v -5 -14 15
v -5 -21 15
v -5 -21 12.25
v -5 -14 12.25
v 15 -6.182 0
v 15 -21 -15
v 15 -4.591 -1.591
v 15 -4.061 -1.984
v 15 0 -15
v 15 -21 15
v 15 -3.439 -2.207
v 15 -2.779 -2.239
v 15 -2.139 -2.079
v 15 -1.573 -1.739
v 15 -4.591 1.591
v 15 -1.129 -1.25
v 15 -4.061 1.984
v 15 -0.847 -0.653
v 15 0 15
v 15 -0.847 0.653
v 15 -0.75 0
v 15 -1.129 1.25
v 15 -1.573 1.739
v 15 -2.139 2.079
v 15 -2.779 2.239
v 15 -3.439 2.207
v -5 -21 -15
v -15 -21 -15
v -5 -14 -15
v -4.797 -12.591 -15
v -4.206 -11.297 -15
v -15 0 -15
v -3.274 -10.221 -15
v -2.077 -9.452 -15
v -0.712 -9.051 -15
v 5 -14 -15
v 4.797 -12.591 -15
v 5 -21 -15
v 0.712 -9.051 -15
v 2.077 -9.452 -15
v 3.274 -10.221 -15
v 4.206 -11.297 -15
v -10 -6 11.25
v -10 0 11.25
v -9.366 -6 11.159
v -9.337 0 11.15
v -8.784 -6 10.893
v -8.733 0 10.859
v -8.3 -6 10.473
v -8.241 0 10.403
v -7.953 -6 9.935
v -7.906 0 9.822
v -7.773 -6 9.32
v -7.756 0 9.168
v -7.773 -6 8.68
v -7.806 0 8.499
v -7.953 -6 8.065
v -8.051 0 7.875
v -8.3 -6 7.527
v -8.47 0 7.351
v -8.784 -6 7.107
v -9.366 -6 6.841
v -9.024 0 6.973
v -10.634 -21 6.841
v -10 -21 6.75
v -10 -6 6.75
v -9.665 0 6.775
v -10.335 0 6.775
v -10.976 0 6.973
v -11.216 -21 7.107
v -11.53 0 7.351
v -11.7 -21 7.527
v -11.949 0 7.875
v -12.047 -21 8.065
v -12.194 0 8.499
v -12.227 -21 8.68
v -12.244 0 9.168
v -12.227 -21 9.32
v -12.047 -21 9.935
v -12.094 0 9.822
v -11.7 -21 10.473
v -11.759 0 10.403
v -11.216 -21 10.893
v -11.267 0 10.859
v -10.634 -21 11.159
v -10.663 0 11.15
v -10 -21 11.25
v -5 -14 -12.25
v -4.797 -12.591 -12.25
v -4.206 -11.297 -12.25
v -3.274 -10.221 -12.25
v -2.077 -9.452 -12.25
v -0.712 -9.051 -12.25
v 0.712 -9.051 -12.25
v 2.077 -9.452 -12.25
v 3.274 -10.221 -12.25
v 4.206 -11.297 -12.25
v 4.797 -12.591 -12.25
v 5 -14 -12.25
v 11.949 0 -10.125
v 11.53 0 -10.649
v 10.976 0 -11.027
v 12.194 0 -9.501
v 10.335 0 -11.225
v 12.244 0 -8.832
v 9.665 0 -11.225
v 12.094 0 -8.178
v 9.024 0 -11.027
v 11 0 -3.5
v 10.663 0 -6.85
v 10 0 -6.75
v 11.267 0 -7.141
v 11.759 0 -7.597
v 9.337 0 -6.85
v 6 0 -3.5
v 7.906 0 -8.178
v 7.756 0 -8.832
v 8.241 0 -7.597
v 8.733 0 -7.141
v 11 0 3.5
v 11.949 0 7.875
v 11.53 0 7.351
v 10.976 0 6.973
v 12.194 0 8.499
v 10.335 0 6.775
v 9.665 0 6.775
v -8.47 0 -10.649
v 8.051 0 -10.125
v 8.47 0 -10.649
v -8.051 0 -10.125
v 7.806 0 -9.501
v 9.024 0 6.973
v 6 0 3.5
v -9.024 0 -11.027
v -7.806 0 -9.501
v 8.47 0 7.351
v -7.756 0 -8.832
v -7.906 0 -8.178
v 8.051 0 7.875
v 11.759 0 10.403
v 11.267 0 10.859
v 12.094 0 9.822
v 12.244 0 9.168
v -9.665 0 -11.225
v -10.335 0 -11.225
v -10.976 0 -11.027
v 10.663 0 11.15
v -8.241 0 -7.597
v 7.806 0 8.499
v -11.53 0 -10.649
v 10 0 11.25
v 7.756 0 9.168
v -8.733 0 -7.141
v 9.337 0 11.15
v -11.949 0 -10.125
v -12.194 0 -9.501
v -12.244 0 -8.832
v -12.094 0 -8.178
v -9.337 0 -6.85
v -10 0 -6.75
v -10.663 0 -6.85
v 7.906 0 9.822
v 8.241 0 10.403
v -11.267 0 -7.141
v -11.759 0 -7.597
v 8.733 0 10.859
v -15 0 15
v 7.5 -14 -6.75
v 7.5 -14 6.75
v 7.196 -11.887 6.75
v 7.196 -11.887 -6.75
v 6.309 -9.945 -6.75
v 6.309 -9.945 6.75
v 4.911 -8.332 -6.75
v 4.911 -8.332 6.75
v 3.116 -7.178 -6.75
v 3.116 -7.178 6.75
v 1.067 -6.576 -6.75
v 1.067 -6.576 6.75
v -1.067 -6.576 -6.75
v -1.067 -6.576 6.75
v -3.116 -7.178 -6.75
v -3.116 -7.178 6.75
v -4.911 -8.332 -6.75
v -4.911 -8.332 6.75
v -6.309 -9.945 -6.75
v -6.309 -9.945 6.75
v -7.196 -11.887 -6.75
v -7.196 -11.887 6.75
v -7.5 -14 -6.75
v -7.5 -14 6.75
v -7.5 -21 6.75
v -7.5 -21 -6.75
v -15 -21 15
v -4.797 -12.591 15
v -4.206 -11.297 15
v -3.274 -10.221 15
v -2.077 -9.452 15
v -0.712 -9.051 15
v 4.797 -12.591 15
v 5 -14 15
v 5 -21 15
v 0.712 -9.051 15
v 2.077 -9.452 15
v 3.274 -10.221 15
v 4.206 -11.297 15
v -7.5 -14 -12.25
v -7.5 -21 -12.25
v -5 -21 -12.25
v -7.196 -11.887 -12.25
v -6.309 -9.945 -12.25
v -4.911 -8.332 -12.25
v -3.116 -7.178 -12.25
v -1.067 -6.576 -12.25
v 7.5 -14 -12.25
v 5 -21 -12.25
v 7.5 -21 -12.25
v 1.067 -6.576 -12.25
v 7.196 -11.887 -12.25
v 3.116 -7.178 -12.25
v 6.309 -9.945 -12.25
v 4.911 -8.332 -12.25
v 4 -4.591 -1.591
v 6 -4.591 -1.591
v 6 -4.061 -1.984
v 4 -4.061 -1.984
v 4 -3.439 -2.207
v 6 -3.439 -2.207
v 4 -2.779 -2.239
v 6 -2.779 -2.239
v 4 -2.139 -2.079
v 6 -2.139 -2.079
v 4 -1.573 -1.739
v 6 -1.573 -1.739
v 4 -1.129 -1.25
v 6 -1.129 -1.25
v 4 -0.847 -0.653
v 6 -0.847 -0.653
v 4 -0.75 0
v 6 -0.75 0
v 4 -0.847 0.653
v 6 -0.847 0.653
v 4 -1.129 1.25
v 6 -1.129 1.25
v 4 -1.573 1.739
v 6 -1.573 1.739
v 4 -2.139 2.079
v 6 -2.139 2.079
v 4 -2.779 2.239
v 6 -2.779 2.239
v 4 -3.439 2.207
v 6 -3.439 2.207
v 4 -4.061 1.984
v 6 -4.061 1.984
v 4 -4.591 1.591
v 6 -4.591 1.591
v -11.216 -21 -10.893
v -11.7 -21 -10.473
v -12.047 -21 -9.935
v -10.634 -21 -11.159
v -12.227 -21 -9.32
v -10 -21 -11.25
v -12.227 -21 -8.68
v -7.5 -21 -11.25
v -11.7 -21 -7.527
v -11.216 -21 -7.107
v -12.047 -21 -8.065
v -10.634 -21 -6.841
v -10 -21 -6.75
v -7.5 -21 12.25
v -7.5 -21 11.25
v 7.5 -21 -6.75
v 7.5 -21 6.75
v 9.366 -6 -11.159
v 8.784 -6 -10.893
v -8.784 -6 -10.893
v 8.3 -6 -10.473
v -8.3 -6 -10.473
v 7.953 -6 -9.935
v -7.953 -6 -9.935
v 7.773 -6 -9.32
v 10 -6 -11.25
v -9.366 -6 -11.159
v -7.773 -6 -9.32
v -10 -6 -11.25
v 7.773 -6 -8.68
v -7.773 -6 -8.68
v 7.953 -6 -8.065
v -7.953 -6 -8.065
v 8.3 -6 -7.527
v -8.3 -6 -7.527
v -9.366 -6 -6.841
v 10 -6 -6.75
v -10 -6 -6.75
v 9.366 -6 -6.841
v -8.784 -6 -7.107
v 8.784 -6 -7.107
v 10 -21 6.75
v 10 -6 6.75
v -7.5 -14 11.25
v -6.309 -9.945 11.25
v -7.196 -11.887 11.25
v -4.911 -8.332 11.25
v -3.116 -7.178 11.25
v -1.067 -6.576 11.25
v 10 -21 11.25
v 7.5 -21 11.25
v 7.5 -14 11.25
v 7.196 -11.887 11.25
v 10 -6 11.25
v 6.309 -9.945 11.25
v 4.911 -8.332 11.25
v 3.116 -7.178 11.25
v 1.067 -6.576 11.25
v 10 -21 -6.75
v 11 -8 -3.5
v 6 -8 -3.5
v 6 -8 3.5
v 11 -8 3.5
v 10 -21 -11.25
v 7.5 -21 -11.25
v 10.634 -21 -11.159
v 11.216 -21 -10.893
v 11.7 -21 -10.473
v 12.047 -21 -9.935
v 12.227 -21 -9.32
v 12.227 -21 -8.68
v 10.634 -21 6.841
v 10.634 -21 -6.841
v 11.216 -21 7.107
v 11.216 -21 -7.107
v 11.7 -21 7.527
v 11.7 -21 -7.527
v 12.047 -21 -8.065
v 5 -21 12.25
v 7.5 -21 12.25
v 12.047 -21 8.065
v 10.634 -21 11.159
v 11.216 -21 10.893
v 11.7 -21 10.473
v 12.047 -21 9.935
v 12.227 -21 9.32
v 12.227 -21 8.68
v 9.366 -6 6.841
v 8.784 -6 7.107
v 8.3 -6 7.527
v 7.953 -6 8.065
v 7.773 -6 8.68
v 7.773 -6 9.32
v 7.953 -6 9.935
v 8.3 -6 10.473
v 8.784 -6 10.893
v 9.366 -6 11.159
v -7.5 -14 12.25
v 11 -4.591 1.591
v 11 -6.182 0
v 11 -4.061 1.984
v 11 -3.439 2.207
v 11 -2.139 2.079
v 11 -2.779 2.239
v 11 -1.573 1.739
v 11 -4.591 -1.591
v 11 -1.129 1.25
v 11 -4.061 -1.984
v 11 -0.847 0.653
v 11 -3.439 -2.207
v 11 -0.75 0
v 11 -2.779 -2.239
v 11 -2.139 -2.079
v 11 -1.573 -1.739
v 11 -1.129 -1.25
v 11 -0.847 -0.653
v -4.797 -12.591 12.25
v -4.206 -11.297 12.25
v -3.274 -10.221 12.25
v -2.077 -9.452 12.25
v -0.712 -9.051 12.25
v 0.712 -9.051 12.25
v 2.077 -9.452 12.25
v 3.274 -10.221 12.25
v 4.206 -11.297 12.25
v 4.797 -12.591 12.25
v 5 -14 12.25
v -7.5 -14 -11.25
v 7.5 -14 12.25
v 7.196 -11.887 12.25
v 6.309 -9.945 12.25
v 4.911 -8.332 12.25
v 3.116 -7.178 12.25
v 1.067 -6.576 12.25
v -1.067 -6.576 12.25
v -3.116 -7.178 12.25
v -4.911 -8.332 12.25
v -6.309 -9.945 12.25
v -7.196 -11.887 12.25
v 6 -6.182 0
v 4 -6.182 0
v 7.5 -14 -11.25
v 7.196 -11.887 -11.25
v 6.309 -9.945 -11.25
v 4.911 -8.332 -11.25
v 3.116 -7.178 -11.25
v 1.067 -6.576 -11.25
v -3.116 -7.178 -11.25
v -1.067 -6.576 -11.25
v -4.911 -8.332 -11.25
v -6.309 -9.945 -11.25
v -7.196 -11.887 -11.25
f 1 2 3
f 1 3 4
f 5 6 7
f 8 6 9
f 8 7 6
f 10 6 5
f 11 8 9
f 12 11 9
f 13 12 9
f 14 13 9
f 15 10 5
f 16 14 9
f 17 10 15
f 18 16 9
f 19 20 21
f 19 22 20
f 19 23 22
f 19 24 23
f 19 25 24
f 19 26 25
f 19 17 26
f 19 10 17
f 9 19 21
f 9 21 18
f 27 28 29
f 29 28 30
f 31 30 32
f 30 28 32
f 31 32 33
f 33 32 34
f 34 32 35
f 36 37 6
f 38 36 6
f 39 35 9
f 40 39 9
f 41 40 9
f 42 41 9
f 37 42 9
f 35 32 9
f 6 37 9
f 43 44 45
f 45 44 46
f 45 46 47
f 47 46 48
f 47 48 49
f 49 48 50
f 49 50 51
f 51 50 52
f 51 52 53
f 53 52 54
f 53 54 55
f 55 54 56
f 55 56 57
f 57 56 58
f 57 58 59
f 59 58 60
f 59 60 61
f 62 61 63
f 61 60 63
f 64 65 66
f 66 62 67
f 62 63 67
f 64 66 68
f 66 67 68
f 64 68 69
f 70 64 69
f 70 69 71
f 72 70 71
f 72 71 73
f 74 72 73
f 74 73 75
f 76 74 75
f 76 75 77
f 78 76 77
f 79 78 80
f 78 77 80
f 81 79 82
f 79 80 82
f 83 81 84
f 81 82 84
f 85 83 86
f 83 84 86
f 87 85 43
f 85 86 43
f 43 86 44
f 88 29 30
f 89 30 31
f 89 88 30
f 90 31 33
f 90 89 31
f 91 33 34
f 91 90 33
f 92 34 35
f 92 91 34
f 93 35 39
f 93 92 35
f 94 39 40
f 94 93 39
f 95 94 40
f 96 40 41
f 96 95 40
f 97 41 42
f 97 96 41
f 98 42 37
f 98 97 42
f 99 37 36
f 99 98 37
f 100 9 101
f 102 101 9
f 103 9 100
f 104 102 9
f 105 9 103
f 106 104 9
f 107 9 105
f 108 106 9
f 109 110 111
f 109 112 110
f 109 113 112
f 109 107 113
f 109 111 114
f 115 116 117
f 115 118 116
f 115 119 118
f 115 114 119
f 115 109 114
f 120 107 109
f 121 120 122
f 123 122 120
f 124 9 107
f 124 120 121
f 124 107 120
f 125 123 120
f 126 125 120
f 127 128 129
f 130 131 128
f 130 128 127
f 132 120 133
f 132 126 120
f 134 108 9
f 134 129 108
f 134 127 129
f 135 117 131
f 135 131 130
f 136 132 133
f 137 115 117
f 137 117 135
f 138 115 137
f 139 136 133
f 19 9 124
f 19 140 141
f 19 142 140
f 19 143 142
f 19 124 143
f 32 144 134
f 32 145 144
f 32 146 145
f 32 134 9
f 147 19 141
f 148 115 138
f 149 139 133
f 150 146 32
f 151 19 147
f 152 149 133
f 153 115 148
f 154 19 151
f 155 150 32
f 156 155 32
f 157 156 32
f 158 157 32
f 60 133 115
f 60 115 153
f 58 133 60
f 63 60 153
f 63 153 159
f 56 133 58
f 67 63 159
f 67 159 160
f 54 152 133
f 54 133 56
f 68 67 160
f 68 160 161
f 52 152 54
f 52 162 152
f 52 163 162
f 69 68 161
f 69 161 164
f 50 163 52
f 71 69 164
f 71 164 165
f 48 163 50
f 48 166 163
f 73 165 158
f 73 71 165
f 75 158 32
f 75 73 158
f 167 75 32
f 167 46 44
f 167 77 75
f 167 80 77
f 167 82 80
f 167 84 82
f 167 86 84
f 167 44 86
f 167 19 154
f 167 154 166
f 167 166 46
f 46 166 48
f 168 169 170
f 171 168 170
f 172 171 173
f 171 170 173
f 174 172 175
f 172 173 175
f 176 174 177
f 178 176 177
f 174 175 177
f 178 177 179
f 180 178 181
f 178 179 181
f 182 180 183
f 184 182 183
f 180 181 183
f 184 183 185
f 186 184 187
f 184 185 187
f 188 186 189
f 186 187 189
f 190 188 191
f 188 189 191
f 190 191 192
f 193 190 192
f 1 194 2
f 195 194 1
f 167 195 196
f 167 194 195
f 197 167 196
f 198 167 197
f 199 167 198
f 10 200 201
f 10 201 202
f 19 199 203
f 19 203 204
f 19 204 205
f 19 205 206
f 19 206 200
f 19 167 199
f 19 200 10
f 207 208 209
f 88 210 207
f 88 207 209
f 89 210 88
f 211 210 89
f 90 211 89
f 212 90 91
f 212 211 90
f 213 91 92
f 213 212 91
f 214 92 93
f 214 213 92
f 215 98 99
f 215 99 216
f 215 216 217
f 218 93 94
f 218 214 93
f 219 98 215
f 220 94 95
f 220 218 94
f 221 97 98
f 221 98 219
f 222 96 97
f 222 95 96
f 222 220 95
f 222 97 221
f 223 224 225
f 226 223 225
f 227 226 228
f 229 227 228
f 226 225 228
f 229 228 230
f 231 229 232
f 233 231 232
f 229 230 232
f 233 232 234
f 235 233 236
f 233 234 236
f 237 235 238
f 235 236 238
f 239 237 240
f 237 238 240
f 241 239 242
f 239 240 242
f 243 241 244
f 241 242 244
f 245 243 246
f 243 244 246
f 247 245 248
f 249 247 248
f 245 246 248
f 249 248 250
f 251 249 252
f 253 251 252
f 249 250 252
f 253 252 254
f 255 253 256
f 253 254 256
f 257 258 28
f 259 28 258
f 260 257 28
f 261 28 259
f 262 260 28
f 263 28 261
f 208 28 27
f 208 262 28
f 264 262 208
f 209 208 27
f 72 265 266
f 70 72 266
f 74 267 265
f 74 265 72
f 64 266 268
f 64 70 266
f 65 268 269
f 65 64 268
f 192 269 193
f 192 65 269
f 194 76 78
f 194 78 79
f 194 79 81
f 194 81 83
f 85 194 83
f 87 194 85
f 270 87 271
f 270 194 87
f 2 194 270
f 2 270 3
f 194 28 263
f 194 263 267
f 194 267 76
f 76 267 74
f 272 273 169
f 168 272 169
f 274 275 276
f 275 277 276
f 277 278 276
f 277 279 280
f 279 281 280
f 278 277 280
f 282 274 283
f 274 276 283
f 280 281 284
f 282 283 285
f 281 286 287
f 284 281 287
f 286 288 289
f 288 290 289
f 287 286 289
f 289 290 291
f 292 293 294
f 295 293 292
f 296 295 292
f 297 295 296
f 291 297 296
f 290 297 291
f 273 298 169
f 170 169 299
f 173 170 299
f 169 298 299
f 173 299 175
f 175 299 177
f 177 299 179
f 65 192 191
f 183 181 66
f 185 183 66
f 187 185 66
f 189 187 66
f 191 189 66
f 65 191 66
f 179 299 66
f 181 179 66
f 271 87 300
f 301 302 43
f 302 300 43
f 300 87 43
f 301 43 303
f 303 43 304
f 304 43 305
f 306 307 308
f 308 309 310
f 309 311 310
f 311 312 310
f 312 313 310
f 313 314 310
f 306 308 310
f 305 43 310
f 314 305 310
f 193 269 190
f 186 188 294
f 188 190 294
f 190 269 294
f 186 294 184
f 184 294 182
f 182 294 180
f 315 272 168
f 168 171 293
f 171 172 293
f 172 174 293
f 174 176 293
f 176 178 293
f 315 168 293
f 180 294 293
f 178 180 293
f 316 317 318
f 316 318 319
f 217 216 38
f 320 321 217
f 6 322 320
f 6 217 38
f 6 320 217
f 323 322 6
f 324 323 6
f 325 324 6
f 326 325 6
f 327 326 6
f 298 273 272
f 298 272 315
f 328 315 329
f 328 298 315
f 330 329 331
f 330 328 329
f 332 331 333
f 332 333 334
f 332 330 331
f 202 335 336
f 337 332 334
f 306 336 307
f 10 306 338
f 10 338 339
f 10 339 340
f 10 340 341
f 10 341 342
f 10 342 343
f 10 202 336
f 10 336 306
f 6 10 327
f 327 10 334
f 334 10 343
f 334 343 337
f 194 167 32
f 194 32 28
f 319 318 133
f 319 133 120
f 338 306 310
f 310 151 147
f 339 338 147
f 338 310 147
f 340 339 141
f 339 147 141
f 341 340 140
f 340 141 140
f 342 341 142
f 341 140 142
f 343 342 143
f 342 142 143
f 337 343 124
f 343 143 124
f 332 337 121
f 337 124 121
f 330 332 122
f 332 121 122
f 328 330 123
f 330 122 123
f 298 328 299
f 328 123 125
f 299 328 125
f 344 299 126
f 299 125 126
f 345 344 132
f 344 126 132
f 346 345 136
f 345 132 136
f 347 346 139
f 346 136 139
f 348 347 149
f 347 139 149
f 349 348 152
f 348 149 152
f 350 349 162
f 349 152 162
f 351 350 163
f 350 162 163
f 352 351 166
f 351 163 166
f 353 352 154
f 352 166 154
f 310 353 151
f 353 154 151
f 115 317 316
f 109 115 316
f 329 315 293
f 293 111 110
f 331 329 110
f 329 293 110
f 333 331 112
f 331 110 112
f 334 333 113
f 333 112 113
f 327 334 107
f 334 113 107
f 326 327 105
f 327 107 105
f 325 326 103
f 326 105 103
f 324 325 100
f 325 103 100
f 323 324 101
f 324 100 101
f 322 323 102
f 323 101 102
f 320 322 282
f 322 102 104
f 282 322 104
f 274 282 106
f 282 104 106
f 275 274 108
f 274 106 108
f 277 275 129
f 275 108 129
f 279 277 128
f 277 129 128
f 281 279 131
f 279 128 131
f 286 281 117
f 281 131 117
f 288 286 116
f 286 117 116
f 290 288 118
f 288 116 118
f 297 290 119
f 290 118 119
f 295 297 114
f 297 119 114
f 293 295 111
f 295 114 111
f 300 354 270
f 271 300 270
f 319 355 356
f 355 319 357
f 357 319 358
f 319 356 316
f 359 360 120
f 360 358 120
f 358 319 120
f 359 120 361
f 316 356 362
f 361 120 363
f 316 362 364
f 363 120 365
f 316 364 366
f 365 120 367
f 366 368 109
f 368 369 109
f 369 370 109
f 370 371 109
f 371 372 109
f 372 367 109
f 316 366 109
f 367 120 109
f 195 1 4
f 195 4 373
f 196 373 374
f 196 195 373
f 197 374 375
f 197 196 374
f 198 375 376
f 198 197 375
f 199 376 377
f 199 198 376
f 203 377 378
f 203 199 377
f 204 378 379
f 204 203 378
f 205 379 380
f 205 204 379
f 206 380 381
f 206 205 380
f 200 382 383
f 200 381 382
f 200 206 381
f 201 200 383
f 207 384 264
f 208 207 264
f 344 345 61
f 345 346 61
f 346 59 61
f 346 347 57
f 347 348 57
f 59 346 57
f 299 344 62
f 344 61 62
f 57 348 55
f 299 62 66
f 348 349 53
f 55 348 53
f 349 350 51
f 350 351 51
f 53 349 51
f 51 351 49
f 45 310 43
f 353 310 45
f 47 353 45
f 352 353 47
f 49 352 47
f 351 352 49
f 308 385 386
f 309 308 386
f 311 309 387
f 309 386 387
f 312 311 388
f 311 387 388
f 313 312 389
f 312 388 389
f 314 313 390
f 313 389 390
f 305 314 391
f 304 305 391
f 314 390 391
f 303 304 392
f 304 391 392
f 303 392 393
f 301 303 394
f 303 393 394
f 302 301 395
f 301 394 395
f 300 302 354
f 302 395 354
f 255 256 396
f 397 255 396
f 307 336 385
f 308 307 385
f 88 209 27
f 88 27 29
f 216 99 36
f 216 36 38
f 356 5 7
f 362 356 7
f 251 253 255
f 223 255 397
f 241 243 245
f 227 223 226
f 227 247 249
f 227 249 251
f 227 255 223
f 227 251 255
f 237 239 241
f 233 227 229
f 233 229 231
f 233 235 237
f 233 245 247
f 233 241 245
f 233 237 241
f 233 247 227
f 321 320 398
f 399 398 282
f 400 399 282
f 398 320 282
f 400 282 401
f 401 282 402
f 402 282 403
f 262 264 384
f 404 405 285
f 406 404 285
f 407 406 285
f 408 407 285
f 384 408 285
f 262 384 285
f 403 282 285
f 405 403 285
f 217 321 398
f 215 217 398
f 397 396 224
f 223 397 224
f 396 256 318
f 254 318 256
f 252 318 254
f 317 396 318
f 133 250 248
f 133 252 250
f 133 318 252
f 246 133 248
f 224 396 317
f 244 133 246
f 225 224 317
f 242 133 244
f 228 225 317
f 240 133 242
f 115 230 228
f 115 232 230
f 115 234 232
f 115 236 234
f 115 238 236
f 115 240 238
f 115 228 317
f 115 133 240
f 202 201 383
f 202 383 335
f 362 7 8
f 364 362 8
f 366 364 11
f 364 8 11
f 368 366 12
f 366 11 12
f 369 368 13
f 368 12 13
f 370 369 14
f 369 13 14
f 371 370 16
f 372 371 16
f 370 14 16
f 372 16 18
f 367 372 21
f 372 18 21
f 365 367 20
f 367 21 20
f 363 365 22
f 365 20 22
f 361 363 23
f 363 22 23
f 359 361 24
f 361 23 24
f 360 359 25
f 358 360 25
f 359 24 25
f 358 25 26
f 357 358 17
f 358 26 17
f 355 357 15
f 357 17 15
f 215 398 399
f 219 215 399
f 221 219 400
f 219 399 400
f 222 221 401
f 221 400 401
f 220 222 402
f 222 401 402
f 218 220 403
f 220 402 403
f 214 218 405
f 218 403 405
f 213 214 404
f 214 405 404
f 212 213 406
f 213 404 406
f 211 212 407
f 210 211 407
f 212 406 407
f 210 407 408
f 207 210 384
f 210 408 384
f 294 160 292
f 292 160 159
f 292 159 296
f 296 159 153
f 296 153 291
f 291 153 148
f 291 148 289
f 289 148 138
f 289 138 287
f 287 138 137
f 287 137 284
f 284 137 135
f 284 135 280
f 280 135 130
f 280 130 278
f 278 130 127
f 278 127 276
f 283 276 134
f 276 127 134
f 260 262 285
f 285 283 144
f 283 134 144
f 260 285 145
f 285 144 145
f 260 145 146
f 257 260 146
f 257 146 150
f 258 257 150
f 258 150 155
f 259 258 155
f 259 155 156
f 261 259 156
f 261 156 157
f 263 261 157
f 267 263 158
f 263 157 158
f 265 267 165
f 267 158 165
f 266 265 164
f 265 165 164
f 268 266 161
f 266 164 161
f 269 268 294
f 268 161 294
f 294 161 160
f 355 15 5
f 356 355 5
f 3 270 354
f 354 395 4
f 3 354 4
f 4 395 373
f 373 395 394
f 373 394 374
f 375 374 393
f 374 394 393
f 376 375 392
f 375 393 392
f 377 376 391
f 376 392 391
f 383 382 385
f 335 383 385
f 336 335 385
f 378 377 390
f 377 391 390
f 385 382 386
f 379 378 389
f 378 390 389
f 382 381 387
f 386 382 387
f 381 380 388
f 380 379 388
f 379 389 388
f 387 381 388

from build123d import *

# Parameters (mm, degrees)
BOSS_EXTRUDE1_DEPTH = 15
SKETCH2_R           = 2.25
CUT_EXTRUDE1_DEPTH  = 30.849623113
CUT_EXTRUDE2_START  = -15
CUT_EXTRUDE2_DEPTH  = 15
CUT_EXTRUDE3_DEPTH  = 12.25
CUT_EXTRUDE4_DEPTH  = 11
SKETCH8_W           = 5
SKETCH8_H           = 7
CUT_EXTRUDE5_DEPTH  = 8


with BuildPart() as part:
    # Sketch1 → Boss-Extrude1 (new, symmetric)
    with BuildSketch(Plane.XY):
        with BuildLine():
            Line((15, 0), (-15, 0))
            Line((-15, 0), (-15, -21))
            Line((-15, -21), (-5, -21))
            Line((-5, -21), (-5, -14))
            ThreePointArc((-5, -14), (0, -9), (5, -14))
            Line((5, -14), (5, -21))
            Line((5, -21), (15, -21))
            Line((15, -21), (15, 0))
        make_face()
    extrude(amount=BOSS_EXTRUDE1_DEPTH, both=True)

    # Sketch2 → Cut-Extrude1 (cut, through all)
    with BuildSketch(Plane(origin=(0, 0, 0), x_dir=(1, 0, 0), z_dir=(0, 1, 0))):
        with Locations((-10, 9)):
            Circle(SKETCH2_R)
        with Locations((10, 9)):
            Circle(SKETCH2_R)
        with Locations((10, -9)):
            Circle(SKETCH2_R)
        with Locations((-10, -9)):
            Circle(SKETCH2_R)
    extrude(amount=-CUT_EXTRUDE1_DEPTH, mode=Mode.SUBTRACT)

    # Sketch3 → Cut-Extrude2 (cut)
    with BuildSketch(Plane.XZ.offset(21).offset(CUT_EXTRUDE2_START)):
        with BuildLine():
            Line((-10, 11.25), (10, 11.25))
            ThreePointArc((10, 11.25), (12.25, 9), (10, 6.75))
            Line((10, 6.75), (-10, 6.75))
            ThreePointArc((-10, 6.75), (-12.25, 9), (-10, 11.25))
        make_face()
        with BuildLine():
            Line((10, -11.25), (-10, -11.25))
            ThreePointArc((-10, -11.25), (-12.25, -9), (-10, -6.75))
            Line((-10, -6.75), (10, -6.75))
            ThreePointArc((10, -6.75), (12.25, -9), (10, -11.25))
        make_face()
    extrude(amount=CUT_EXTRUDE2_DEPTH, mode=Mode.SUBTRACT)

    # Sketch4 → Cut-Extrude3 (cut, symmetric)
    with BuildSketch(Plane.XY):
        with BuildLine():
            Line((-7.5, -14), (-7.5, -21))
            Line((-7.5, -21), (7.5, -21))
            Line((7.5, -21), (7.5, -14))
            ThreePointArc((7.5, -14), (0, -6.5), (-7.5, -14))
        make_face()
    extrude(amount=CUT_EXTRUDE3_DEPTH, both=True, mode=Mode.SUBTRACT)

    # Sketch7 → Cut-Extrude4 (cut)
    with BuildSketch(Plane(origin=(15, 0, 0), x_dir=(0, 0, -1), z_dir=(1, 0, 0))):
        with BuildLine():
            Line((-1.590990258, -4.590990258), (0, -6.181980515))
            Line((0, -6.181980515), (1.590990258, -4.590990258))
            ThreePointArc((1.590990258, -4.590990258), (0, -0.75), (-1.590990258, -4.590990258))
        make_face()
    extrude(amount=-CUT_EXTRUDE4_DEPTH, mode=Mode.SUBTRACT)

    # Sketch8 → Cut-Extrude5 (cut)
    with BuildSketch(Plane(origin=(0, 0, 0), x_dir=(1, 0, 0), z_dir=(0, 1, 0))):
        with Locations((8.5, 0)):
            Rectangle(SKETCH8_W, SKETCH8_H)
    extrude(amount=-CUT_EXTRUDE5_DEPTH, mode=Mode.SUBTRACT)


solid = part.part
